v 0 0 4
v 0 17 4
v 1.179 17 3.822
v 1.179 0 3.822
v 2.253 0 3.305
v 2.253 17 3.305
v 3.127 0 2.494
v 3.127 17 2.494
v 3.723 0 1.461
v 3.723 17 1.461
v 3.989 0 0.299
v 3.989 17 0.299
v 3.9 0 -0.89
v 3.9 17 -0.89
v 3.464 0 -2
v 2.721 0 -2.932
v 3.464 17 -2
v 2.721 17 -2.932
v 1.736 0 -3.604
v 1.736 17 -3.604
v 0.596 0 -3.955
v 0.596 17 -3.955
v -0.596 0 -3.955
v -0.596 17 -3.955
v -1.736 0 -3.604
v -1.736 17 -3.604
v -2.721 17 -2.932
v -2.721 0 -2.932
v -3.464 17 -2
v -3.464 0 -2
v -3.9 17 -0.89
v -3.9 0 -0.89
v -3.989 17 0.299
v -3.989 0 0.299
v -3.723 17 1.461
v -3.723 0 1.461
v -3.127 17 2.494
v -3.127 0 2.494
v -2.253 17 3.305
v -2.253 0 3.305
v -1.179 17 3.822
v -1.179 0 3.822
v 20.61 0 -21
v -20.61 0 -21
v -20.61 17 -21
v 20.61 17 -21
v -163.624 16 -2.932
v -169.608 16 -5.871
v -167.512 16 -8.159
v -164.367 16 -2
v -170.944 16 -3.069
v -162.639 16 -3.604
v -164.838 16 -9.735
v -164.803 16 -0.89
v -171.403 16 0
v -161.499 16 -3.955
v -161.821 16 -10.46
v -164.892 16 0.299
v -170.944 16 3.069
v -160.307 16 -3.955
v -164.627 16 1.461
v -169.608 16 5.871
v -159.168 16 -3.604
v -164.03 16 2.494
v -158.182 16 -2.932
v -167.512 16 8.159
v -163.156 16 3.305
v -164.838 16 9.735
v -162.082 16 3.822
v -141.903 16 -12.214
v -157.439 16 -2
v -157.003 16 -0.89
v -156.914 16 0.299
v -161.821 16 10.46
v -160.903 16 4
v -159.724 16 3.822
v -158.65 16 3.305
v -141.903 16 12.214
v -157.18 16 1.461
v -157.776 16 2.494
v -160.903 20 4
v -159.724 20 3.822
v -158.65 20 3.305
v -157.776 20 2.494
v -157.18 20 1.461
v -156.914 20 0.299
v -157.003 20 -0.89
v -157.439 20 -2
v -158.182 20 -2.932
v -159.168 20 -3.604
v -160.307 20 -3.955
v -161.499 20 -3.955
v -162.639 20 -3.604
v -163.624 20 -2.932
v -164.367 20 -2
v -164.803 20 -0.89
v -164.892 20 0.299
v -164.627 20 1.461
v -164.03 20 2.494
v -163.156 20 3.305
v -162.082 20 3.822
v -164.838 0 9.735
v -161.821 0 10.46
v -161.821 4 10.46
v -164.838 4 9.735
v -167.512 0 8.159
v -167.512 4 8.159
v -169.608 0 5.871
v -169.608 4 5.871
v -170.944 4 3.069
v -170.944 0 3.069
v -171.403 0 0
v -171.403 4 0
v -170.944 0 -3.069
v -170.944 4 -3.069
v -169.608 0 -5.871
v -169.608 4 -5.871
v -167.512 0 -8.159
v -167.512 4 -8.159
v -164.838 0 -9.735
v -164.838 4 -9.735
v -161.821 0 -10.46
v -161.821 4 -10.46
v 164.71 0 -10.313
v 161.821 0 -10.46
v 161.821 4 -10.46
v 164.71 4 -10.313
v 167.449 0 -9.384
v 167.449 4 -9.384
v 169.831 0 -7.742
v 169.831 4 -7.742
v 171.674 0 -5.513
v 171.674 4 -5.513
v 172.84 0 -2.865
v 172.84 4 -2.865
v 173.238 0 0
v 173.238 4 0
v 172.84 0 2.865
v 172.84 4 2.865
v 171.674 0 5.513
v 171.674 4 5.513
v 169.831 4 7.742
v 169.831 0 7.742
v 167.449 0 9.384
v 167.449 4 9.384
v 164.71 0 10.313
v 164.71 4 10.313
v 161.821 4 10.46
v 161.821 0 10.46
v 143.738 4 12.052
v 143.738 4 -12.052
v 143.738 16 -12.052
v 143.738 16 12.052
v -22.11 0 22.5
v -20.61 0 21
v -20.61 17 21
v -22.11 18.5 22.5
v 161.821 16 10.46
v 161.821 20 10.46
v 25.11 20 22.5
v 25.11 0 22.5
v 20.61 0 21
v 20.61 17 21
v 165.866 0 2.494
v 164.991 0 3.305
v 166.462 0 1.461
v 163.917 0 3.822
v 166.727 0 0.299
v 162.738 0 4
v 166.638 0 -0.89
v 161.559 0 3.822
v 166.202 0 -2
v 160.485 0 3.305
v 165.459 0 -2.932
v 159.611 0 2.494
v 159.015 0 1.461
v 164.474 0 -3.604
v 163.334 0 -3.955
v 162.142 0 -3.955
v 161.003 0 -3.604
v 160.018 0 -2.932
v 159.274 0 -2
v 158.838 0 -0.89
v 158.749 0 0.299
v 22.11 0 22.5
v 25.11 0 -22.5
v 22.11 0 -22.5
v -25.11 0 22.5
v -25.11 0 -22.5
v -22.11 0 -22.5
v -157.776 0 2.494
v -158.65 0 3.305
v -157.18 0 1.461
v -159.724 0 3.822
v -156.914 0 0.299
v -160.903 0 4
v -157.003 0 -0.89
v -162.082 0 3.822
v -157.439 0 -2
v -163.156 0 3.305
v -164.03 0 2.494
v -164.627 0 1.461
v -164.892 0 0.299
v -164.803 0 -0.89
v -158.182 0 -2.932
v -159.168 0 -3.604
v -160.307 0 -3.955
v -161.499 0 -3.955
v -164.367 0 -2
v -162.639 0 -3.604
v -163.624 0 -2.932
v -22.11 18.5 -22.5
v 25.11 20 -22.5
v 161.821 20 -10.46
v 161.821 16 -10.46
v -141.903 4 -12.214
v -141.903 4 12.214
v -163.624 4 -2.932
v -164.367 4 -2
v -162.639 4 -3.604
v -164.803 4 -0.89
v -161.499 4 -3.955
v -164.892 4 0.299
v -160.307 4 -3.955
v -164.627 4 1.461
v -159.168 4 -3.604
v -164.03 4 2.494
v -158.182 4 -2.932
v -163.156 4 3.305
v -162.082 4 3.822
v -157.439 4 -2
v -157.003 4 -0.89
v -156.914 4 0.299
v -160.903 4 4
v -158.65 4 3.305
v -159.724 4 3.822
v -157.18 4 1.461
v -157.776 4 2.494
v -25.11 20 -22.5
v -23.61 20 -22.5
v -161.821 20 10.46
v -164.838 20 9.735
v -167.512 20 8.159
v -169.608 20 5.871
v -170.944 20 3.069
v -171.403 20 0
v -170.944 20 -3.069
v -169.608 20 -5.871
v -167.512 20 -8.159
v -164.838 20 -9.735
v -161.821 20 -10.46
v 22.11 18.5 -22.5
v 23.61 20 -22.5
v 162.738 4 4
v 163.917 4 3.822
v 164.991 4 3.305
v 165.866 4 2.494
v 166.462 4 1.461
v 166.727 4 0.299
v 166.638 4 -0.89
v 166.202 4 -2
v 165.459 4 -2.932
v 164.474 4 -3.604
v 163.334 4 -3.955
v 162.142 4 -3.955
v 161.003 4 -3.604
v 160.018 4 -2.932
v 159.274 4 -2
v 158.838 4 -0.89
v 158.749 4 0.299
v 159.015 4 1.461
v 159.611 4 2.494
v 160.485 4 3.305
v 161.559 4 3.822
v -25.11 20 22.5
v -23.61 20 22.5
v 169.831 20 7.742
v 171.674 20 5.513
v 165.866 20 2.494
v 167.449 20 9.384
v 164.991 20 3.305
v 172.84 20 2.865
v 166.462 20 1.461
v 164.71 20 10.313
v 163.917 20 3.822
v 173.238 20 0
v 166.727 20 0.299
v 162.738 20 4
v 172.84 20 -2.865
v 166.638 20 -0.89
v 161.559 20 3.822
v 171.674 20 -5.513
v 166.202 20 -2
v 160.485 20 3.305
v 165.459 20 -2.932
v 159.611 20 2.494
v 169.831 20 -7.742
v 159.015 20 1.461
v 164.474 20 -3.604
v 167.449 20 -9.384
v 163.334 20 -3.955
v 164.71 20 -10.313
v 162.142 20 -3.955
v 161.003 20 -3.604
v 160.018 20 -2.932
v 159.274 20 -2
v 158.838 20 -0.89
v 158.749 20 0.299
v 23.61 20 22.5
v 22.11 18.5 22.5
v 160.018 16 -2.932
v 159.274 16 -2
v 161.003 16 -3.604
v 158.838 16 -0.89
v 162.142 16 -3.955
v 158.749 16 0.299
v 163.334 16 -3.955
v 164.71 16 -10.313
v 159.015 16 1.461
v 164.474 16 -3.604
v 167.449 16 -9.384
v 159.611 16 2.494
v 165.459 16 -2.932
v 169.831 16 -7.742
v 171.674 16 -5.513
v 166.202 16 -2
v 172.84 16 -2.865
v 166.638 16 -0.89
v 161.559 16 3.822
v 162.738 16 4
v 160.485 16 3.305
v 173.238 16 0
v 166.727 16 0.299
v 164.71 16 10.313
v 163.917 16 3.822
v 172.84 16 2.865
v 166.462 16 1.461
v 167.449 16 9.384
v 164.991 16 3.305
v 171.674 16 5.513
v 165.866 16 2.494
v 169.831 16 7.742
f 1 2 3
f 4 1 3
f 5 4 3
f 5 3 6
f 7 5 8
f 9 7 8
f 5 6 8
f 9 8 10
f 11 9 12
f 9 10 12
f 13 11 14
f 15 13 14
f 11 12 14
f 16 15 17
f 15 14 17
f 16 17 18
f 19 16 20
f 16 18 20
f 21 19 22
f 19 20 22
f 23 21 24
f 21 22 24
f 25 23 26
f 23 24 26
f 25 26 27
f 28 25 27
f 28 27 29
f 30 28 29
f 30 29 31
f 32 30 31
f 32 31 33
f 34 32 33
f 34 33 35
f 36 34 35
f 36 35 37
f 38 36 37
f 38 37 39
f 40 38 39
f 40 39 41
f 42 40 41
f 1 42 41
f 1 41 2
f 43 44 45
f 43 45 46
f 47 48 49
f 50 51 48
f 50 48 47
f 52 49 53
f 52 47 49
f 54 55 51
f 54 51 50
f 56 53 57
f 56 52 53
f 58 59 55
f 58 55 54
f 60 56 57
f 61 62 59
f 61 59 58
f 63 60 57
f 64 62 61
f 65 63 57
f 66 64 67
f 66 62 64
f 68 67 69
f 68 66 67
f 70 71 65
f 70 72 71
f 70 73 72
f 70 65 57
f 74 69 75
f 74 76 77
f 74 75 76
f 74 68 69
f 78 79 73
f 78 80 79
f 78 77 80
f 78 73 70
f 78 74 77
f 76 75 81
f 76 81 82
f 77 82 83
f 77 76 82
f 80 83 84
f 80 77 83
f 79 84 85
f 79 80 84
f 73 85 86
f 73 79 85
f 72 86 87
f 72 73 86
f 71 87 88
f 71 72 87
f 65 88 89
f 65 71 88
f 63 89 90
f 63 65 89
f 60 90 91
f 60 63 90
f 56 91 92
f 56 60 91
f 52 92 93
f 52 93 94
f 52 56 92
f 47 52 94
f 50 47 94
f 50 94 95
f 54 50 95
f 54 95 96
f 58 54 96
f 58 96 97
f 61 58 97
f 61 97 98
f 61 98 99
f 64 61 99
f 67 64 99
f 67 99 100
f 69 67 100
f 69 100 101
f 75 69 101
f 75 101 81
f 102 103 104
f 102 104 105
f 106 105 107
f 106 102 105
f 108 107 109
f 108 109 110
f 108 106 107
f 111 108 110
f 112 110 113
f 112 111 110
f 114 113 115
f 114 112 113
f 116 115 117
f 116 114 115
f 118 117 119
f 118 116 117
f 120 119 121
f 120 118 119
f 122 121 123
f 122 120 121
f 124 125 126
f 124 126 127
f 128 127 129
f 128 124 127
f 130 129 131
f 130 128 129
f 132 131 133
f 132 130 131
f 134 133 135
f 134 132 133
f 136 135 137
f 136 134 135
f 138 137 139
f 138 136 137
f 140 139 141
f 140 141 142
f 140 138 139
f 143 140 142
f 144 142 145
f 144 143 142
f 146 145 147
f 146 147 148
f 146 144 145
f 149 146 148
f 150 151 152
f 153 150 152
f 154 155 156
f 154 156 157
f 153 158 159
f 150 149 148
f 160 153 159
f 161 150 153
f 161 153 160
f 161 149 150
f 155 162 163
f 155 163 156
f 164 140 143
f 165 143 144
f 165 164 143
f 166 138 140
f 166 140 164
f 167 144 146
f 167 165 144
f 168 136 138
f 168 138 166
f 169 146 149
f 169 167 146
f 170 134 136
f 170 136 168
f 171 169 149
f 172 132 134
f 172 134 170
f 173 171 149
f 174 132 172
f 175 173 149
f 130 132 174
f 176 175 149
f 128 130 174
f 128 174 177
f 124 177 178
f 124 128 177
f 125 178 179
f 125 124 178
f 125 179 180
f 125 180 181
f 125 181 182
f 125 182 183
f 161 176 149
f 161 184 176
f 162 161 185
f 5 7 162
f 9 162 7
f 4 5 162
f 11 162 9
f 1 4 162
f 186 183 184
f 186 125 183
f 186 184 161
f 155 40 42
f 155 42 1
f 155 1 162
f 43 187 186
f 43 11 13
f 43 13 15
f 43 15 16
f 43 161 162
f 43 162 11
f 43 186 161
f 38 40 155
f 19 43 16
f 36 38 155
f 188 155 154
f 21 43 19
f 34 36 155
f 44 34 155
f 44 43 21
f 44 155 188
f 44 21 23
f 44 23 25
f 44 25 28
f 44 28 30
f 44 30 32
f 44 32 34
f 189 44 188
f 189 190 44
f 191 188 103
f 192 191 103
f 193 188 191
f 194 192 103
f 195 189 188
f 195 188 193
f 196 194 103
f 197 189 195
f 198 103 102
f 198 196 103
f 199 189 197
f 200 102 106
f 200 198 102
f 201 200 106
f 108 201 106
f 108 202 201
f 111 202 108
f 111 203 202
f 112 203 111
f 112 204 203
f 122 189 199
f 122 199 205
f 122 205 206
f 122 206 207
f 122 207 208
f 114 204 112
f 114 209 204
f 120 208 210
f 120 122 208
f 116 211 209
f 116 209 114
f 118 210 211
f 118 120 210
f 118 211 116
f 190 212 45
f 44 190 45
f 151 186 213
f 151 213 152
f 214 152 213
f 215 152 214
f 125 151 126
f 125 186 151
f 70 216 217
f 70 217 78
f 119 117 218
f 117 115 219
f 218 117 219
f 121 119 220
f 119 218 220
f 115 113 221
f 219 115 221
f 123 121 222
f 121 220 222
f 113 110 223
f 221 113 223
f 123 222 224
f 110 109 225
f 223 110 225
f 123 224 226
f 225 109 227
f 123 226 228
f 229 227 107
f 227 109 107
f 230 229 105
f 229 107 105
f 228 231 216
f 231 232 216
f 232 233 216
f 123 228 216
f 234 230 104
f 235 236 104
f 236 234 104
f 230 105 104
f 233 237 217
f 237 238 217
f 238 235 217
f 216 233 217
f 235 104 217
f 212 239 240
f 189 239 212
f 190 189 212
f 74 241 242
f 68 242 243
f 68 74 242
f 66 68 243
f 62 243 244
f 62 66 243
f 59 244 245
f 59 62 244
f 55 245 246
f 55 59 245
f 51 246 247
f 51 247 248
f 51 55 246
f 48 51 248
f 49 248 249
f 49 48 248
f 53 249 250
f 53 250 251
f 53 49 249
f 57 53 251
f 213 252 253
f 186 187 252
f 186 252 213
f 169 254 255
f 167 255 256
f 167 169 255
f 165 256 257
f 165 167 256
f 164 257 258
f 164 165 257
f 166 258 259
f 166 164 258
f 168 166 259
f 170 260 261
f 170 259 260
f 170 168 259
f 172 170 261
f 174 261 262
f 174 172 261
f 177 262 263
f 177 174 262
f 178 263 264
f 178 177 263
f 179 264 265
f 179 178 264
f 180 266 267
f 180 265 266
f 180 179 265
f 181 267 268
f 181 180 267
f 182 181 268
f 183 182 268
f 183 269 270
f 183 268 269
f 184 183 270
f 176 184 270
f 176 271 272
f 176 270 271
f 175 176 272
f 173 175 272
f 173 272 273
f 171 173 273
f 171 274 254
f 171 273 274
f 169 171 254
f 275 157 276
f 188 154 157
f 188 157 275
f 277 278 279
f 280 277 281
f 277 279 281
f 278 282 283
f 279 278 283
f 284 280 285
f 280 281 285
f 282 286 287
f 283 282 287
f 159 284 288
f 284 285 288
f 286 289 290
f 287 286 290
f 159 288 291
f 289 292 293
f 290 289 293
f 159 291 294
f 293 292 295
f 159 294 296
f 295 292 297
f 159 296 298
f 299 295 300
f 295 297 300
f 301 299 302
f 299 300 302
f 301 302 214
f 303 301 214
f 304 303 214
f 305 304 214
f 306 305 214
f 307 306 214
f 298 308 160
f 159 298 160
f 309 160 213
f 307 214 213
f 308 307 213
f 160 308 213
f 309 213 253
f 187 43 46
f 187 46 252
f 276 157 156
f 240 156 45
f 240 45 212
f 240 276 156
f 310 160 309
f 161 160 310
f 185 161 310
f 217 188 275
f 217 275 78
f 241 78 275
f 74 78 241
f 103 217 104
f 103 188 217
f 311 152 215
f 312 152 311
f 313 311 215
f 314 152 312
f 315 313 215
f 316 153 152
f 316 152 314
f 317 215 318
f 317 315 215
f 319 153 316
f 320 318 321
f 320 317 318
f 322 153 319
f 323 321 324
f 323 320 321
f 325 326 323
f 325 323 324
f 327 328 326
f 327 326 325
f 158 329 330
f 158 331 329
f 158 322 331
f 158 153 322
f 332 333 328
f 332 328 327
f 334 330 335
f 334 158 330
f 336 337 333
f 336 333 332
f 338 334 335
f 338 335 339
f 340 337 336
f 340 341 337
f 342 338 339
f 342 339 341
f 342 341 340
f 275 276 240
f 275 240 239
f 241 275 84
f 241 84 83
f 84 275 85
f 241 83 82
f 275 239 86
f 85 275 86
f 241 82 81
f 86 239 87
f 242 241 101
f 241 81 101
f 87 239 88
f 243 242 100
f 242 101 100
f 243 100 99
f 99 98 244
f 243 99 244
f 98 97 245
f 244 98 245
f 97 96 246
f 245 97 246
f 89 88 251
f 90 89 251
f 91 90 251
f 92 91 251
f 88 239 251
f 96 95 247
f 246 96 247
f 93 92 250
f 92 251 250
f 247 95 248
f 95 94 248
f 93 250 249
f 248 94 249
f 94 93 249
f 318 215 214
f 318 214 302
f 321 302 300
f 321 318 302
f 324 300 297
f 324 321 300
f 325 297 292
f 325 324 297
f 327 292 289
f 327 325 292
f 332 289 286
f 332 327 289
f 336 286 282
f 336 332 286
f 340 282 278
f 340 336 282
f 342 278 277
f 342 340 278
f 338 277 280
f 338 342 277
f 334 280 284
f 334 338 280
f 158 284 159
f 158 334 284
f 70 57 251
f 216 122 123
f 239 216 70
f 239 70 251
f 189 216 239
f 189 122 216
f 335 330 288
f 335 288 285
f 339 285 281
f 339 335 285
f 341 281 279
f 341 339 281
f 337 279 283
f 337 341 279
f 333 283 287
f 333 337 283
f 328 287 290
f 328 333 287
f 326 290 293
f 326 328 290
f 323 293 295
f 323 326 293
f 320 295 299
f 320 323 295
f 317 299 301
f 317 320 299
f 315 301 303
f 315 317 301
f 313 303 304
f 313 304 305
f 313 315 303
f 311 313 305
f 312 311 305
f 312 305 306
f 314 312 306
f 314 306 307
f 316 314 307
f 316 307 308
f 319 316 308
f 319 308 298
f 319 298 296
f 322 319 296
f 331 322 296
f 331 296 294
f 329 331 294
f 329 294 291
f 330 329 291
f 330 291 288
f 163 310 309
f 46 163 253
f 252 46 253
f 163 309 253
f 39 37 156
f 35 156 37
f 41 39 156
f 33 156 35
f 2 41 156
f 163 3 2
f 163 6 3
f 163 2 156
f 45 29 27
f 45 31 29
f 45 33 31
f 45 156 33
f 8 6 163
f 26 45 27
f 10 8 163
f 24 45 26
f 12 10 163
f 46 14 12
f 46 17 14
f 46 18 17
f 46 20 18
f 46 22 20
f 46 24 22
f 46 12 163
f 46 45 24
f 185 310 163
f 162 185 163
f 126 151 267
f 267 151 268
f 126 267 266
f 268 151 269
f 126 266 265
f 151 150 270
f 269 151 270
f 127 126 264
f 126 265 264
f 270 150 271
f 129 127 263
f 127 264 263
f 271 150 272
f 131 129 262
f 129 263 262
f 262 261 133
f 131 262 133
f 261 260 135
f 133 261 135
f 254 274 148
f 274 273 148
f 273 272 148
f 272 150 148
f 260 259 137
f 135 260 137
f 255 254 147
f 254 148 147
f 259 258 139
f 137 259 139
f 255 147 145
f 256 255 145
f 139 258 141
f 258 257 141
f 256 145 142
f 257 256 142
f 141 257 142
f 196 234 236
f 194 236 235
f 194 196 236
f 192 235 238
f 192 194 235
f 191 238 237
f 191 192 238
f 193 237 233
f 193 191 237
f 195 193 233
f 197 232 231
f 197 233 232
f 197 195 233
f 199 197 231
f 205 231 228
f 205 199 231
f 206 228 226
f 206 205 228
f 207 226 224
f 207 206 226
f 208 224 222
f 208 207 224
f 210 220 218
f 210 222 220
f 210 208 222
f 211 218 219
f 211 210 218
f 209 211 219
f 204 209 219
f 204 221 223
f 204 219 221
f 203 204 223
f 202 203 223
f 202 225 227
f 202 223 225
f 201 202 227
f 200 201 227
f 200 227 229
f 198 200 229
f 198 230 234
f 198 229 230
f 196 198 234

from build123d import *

# Parameters (mm, degrees)
CROQUIS1_R              = 4
SALIENTE_EXTRUIR1_DEPTH = 20
CROQUIS2_W              = 29.5
CROQUIS2_H              = 12
CORTAR_EXTRUIR1_DEPTH   = 180.732329924
CROQUIS3_W              = 41.22
CROQUIS3_H              = 42
CORTAR_EXTRUIR2_DEPTH   = 3
CHAFL_N1_SIZE           = 3
CROQUIS4_R              = 4
CORTAR_EXTRUIR3_DEPTH   = 176.518425627


with BuildPart() as part:
    # Croquis1 → Saliente-Extruir1 (new body)
    with BuildSketch(Plane(origin=(0, 0, 0), x_dir=(1, 0, 0), z_dir=(0, 1, 0))):
        with BuildLine():
            Line((20.61, 21), (22.109773483, 22.499773483))
            Line((22.109773483, 22.499773483), (25.109773482, 22.499825843))
            Line((25.109773482, 22.499825843), (161.820621985, 10.459829919))
            ThreePointArc((161.820621985, 10.459829919), (173.238204711, 0), (161.820621985, -10.459829919))
            Line((161.820621985, -10.459829919), (25.109773482, -22.499825843))
            Line((25.109773482, -22.499825843), (22.109773483, -22.499773483))
            Line((22.109773483, -22.499773483), (20.61, -21))
            Line((20.61, -21), (-20.61, -21))
            Line((-20.61, -21), (-22.109773483, -22.499773483))
            Line((-22.109773483, -22.499773483), (-25.109773482, -22.499825843))
            Line((-25.109773482, -22.499825843), (-161.820621985, -10.459829919))
            ThreePointArc((-161.820621985, -10.459829919), (-171.403039258, 0), (-161.820621985, 10.459829919))
            Line((-161.820621985, 10.459829919), (-25.109773482, 22.499825843))
            Line((-25.109773482, 22.499825843), (-22.109773483, 22.499773483))
            Line((-22.109773483, 22.499773483), (-20.61, 21))
            Line((-20.61, 21), (20.61, 21))
        make_face()
        with Locations(Location((-160.903039258, 0, 0), (0, 0, 270))):
            Circle(CROQUIS1_R, mode=Mode.SUBTRACT)
        with Locations(Location((162.738204711, 0, 0), (0, 0, 270))):
            Circle(CROQUIS1_R, mode=Mode.SUBTRACT)
    extrude(amount=SALIENTE_EXTRUIR1_DEPTH)

    # Croquis2 → Cortar-Extruir1 (cut, through all)
    with BuildSketch(Plane.XY.offset(21)):
        with Locations((-156.653039258, 10)):
            Rectangle(CROQUIS2_W, CROQUIS2_H)
        with Locations((158.488204711, 10)):
            Rectangle(CROQUIS2_W, CROQUIS2_H)
    extrude(amount=-CORTAR_EXTRUIR1_DEPTH, mode=Mode.SUBTRACT)

    # Croquis3 → Cortar-Extruir2 (cut)
    with BuildSketch(Plane(origin=(0, 20, 0), x_dir=(1, 0, 0), z_dir=(0, 1, 0))):
        Rectangle(CROQUIS3_W, CROQUIS3_H)
    extrude(amount=-CORTAR_EXTRUIR2_DEPTH, mode=Mode.SUBTRACT)

    # Chaflán1
    chafl_n1_edges = [part.edges().sort_by_distance(p)[0] for p in [
        (20.61, 20, 0),
        (-20.61, 20, 0),
    ]]
    chamfer(chafl_n1_edges, length=CHAFL_N1_SIZE - 0.0001)  # a hair under: the kernel refuses the full size

    # Croquis4 → Cortar-Extruir3 (cut, through all)
    with BuildSketch(Plane(origin=(0, 17, 0), x_dir=(1, 0, 0), z_dir=(0, 1, 0))):
        with Locations(Location((0, 0, 0), (0, 0, 270))):
            Circle(CROQUIS4_R)
    extrude(amount=-CORTAR_EXTRUIR3_DEPTH, mode=Mode.SUBTRACT)


solid = part.part
